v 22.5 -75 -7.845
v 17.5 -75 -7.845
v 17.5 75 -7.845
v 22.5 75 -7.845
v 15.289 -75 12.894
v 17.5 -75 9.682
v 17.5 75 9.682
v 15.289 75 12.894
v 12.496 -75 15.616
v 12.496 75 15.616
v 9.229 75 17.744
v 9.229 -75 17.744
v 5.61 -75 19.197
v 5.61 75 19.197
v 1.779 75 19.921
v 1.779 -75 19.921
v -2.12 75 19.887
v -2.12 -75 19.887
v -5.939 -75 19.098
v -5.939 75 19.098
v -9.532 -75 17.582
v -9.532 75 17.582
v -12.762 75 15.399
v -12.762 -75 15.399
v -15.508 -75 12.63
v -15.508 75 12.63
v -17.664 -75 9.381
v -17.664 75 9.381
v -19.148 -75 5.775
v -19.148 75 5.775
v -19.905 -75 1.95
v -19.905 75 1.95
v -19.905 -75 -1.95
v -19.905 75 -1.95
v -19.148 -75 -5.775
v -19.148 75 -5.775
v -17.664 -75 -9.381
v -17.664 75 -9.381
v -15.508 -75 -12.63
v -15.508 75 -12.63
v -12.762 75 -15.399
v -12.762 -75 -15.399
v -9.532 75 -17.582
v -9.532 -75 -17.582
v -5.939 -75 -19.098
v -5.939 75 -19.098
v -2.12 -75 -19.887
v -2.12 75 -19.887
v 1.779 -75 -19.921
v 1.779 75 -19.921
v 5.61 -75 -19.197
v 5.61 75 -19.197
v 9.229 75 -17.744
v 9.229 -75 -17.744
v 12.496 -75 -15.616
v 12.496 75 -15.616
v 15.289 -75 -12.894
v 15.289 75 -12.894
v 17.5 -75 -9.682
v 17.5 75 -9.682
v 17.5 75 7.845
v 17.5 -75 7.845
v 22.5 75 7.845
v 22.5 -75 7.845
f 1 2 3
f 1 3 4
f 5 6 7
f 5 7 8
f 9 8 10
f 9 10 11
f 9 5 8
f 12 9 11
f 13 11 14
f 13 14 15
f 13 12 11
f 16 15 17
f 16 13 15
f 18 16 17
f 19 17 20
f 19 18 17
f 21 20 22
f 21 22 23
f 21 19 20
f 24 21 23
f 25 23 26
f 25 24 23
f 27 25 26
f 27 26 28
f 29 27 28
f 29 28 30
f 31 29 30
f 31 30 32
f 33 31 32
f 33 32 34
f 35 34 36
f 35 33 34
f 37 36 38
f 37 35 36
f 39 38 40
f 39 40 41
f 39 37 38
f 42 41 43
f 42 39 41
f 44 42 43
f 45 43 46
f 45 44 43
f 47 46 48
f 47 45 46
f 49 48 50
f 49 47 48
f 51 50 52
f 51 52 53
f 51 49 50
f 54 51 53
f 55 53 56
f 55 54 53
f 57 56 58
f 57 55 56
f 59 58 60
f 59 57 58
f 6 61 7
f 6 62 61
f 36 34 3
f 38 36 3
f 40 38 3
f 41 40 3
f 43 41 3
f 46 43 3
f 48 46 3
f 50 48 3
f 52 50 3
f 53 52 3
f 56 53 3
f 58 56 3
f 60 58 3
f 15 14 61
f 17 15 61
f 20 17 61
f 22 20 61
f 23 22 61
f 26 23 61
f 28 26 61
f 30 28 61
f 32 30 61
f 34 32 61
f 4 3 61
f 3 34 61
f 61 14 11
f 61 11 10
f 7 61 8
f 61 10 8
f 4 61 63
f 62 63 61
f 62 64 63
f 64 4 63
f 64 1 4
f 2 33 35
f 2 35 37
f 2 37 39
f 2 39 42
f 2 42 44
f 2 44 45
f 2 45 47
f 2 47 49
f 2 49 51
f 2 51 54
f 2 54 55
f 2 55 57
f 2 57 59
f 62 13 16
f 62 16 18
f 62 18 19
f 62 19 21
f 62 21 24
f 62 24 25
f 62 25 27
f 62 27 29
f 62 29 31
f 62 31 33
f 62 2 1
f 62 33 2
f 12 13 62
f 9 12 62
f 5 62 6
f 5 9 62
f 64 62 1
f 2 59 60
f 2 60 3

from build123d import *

# Parameters (mm, degrees)
F1_DEPTH = 75


with BuildPart() as f1:
    # F0 (on Front) → F1 (new body, symmetric)
    with BuildSketch(Plane.XZ):
        with BuildLine():
            Line((17.5, 7.844628), (17.5, 9.682458))
            ThreePointArc((17.5, 9.682458), (-20, 0), (17.5, -9.682458))
            Line((17.5, -9.682458), (17.5, -7.844628))
            Line((17.5, -7.844628), (22.5, -7.844628))
            Line((22.5, -7.844628), (22.5, 7.844628))
            Line((22.5, 7.844628), (17.5, 7.844628))
        make_face()
    extrude(amount=F1_DEPTH, both=True)


solid = f1.part
